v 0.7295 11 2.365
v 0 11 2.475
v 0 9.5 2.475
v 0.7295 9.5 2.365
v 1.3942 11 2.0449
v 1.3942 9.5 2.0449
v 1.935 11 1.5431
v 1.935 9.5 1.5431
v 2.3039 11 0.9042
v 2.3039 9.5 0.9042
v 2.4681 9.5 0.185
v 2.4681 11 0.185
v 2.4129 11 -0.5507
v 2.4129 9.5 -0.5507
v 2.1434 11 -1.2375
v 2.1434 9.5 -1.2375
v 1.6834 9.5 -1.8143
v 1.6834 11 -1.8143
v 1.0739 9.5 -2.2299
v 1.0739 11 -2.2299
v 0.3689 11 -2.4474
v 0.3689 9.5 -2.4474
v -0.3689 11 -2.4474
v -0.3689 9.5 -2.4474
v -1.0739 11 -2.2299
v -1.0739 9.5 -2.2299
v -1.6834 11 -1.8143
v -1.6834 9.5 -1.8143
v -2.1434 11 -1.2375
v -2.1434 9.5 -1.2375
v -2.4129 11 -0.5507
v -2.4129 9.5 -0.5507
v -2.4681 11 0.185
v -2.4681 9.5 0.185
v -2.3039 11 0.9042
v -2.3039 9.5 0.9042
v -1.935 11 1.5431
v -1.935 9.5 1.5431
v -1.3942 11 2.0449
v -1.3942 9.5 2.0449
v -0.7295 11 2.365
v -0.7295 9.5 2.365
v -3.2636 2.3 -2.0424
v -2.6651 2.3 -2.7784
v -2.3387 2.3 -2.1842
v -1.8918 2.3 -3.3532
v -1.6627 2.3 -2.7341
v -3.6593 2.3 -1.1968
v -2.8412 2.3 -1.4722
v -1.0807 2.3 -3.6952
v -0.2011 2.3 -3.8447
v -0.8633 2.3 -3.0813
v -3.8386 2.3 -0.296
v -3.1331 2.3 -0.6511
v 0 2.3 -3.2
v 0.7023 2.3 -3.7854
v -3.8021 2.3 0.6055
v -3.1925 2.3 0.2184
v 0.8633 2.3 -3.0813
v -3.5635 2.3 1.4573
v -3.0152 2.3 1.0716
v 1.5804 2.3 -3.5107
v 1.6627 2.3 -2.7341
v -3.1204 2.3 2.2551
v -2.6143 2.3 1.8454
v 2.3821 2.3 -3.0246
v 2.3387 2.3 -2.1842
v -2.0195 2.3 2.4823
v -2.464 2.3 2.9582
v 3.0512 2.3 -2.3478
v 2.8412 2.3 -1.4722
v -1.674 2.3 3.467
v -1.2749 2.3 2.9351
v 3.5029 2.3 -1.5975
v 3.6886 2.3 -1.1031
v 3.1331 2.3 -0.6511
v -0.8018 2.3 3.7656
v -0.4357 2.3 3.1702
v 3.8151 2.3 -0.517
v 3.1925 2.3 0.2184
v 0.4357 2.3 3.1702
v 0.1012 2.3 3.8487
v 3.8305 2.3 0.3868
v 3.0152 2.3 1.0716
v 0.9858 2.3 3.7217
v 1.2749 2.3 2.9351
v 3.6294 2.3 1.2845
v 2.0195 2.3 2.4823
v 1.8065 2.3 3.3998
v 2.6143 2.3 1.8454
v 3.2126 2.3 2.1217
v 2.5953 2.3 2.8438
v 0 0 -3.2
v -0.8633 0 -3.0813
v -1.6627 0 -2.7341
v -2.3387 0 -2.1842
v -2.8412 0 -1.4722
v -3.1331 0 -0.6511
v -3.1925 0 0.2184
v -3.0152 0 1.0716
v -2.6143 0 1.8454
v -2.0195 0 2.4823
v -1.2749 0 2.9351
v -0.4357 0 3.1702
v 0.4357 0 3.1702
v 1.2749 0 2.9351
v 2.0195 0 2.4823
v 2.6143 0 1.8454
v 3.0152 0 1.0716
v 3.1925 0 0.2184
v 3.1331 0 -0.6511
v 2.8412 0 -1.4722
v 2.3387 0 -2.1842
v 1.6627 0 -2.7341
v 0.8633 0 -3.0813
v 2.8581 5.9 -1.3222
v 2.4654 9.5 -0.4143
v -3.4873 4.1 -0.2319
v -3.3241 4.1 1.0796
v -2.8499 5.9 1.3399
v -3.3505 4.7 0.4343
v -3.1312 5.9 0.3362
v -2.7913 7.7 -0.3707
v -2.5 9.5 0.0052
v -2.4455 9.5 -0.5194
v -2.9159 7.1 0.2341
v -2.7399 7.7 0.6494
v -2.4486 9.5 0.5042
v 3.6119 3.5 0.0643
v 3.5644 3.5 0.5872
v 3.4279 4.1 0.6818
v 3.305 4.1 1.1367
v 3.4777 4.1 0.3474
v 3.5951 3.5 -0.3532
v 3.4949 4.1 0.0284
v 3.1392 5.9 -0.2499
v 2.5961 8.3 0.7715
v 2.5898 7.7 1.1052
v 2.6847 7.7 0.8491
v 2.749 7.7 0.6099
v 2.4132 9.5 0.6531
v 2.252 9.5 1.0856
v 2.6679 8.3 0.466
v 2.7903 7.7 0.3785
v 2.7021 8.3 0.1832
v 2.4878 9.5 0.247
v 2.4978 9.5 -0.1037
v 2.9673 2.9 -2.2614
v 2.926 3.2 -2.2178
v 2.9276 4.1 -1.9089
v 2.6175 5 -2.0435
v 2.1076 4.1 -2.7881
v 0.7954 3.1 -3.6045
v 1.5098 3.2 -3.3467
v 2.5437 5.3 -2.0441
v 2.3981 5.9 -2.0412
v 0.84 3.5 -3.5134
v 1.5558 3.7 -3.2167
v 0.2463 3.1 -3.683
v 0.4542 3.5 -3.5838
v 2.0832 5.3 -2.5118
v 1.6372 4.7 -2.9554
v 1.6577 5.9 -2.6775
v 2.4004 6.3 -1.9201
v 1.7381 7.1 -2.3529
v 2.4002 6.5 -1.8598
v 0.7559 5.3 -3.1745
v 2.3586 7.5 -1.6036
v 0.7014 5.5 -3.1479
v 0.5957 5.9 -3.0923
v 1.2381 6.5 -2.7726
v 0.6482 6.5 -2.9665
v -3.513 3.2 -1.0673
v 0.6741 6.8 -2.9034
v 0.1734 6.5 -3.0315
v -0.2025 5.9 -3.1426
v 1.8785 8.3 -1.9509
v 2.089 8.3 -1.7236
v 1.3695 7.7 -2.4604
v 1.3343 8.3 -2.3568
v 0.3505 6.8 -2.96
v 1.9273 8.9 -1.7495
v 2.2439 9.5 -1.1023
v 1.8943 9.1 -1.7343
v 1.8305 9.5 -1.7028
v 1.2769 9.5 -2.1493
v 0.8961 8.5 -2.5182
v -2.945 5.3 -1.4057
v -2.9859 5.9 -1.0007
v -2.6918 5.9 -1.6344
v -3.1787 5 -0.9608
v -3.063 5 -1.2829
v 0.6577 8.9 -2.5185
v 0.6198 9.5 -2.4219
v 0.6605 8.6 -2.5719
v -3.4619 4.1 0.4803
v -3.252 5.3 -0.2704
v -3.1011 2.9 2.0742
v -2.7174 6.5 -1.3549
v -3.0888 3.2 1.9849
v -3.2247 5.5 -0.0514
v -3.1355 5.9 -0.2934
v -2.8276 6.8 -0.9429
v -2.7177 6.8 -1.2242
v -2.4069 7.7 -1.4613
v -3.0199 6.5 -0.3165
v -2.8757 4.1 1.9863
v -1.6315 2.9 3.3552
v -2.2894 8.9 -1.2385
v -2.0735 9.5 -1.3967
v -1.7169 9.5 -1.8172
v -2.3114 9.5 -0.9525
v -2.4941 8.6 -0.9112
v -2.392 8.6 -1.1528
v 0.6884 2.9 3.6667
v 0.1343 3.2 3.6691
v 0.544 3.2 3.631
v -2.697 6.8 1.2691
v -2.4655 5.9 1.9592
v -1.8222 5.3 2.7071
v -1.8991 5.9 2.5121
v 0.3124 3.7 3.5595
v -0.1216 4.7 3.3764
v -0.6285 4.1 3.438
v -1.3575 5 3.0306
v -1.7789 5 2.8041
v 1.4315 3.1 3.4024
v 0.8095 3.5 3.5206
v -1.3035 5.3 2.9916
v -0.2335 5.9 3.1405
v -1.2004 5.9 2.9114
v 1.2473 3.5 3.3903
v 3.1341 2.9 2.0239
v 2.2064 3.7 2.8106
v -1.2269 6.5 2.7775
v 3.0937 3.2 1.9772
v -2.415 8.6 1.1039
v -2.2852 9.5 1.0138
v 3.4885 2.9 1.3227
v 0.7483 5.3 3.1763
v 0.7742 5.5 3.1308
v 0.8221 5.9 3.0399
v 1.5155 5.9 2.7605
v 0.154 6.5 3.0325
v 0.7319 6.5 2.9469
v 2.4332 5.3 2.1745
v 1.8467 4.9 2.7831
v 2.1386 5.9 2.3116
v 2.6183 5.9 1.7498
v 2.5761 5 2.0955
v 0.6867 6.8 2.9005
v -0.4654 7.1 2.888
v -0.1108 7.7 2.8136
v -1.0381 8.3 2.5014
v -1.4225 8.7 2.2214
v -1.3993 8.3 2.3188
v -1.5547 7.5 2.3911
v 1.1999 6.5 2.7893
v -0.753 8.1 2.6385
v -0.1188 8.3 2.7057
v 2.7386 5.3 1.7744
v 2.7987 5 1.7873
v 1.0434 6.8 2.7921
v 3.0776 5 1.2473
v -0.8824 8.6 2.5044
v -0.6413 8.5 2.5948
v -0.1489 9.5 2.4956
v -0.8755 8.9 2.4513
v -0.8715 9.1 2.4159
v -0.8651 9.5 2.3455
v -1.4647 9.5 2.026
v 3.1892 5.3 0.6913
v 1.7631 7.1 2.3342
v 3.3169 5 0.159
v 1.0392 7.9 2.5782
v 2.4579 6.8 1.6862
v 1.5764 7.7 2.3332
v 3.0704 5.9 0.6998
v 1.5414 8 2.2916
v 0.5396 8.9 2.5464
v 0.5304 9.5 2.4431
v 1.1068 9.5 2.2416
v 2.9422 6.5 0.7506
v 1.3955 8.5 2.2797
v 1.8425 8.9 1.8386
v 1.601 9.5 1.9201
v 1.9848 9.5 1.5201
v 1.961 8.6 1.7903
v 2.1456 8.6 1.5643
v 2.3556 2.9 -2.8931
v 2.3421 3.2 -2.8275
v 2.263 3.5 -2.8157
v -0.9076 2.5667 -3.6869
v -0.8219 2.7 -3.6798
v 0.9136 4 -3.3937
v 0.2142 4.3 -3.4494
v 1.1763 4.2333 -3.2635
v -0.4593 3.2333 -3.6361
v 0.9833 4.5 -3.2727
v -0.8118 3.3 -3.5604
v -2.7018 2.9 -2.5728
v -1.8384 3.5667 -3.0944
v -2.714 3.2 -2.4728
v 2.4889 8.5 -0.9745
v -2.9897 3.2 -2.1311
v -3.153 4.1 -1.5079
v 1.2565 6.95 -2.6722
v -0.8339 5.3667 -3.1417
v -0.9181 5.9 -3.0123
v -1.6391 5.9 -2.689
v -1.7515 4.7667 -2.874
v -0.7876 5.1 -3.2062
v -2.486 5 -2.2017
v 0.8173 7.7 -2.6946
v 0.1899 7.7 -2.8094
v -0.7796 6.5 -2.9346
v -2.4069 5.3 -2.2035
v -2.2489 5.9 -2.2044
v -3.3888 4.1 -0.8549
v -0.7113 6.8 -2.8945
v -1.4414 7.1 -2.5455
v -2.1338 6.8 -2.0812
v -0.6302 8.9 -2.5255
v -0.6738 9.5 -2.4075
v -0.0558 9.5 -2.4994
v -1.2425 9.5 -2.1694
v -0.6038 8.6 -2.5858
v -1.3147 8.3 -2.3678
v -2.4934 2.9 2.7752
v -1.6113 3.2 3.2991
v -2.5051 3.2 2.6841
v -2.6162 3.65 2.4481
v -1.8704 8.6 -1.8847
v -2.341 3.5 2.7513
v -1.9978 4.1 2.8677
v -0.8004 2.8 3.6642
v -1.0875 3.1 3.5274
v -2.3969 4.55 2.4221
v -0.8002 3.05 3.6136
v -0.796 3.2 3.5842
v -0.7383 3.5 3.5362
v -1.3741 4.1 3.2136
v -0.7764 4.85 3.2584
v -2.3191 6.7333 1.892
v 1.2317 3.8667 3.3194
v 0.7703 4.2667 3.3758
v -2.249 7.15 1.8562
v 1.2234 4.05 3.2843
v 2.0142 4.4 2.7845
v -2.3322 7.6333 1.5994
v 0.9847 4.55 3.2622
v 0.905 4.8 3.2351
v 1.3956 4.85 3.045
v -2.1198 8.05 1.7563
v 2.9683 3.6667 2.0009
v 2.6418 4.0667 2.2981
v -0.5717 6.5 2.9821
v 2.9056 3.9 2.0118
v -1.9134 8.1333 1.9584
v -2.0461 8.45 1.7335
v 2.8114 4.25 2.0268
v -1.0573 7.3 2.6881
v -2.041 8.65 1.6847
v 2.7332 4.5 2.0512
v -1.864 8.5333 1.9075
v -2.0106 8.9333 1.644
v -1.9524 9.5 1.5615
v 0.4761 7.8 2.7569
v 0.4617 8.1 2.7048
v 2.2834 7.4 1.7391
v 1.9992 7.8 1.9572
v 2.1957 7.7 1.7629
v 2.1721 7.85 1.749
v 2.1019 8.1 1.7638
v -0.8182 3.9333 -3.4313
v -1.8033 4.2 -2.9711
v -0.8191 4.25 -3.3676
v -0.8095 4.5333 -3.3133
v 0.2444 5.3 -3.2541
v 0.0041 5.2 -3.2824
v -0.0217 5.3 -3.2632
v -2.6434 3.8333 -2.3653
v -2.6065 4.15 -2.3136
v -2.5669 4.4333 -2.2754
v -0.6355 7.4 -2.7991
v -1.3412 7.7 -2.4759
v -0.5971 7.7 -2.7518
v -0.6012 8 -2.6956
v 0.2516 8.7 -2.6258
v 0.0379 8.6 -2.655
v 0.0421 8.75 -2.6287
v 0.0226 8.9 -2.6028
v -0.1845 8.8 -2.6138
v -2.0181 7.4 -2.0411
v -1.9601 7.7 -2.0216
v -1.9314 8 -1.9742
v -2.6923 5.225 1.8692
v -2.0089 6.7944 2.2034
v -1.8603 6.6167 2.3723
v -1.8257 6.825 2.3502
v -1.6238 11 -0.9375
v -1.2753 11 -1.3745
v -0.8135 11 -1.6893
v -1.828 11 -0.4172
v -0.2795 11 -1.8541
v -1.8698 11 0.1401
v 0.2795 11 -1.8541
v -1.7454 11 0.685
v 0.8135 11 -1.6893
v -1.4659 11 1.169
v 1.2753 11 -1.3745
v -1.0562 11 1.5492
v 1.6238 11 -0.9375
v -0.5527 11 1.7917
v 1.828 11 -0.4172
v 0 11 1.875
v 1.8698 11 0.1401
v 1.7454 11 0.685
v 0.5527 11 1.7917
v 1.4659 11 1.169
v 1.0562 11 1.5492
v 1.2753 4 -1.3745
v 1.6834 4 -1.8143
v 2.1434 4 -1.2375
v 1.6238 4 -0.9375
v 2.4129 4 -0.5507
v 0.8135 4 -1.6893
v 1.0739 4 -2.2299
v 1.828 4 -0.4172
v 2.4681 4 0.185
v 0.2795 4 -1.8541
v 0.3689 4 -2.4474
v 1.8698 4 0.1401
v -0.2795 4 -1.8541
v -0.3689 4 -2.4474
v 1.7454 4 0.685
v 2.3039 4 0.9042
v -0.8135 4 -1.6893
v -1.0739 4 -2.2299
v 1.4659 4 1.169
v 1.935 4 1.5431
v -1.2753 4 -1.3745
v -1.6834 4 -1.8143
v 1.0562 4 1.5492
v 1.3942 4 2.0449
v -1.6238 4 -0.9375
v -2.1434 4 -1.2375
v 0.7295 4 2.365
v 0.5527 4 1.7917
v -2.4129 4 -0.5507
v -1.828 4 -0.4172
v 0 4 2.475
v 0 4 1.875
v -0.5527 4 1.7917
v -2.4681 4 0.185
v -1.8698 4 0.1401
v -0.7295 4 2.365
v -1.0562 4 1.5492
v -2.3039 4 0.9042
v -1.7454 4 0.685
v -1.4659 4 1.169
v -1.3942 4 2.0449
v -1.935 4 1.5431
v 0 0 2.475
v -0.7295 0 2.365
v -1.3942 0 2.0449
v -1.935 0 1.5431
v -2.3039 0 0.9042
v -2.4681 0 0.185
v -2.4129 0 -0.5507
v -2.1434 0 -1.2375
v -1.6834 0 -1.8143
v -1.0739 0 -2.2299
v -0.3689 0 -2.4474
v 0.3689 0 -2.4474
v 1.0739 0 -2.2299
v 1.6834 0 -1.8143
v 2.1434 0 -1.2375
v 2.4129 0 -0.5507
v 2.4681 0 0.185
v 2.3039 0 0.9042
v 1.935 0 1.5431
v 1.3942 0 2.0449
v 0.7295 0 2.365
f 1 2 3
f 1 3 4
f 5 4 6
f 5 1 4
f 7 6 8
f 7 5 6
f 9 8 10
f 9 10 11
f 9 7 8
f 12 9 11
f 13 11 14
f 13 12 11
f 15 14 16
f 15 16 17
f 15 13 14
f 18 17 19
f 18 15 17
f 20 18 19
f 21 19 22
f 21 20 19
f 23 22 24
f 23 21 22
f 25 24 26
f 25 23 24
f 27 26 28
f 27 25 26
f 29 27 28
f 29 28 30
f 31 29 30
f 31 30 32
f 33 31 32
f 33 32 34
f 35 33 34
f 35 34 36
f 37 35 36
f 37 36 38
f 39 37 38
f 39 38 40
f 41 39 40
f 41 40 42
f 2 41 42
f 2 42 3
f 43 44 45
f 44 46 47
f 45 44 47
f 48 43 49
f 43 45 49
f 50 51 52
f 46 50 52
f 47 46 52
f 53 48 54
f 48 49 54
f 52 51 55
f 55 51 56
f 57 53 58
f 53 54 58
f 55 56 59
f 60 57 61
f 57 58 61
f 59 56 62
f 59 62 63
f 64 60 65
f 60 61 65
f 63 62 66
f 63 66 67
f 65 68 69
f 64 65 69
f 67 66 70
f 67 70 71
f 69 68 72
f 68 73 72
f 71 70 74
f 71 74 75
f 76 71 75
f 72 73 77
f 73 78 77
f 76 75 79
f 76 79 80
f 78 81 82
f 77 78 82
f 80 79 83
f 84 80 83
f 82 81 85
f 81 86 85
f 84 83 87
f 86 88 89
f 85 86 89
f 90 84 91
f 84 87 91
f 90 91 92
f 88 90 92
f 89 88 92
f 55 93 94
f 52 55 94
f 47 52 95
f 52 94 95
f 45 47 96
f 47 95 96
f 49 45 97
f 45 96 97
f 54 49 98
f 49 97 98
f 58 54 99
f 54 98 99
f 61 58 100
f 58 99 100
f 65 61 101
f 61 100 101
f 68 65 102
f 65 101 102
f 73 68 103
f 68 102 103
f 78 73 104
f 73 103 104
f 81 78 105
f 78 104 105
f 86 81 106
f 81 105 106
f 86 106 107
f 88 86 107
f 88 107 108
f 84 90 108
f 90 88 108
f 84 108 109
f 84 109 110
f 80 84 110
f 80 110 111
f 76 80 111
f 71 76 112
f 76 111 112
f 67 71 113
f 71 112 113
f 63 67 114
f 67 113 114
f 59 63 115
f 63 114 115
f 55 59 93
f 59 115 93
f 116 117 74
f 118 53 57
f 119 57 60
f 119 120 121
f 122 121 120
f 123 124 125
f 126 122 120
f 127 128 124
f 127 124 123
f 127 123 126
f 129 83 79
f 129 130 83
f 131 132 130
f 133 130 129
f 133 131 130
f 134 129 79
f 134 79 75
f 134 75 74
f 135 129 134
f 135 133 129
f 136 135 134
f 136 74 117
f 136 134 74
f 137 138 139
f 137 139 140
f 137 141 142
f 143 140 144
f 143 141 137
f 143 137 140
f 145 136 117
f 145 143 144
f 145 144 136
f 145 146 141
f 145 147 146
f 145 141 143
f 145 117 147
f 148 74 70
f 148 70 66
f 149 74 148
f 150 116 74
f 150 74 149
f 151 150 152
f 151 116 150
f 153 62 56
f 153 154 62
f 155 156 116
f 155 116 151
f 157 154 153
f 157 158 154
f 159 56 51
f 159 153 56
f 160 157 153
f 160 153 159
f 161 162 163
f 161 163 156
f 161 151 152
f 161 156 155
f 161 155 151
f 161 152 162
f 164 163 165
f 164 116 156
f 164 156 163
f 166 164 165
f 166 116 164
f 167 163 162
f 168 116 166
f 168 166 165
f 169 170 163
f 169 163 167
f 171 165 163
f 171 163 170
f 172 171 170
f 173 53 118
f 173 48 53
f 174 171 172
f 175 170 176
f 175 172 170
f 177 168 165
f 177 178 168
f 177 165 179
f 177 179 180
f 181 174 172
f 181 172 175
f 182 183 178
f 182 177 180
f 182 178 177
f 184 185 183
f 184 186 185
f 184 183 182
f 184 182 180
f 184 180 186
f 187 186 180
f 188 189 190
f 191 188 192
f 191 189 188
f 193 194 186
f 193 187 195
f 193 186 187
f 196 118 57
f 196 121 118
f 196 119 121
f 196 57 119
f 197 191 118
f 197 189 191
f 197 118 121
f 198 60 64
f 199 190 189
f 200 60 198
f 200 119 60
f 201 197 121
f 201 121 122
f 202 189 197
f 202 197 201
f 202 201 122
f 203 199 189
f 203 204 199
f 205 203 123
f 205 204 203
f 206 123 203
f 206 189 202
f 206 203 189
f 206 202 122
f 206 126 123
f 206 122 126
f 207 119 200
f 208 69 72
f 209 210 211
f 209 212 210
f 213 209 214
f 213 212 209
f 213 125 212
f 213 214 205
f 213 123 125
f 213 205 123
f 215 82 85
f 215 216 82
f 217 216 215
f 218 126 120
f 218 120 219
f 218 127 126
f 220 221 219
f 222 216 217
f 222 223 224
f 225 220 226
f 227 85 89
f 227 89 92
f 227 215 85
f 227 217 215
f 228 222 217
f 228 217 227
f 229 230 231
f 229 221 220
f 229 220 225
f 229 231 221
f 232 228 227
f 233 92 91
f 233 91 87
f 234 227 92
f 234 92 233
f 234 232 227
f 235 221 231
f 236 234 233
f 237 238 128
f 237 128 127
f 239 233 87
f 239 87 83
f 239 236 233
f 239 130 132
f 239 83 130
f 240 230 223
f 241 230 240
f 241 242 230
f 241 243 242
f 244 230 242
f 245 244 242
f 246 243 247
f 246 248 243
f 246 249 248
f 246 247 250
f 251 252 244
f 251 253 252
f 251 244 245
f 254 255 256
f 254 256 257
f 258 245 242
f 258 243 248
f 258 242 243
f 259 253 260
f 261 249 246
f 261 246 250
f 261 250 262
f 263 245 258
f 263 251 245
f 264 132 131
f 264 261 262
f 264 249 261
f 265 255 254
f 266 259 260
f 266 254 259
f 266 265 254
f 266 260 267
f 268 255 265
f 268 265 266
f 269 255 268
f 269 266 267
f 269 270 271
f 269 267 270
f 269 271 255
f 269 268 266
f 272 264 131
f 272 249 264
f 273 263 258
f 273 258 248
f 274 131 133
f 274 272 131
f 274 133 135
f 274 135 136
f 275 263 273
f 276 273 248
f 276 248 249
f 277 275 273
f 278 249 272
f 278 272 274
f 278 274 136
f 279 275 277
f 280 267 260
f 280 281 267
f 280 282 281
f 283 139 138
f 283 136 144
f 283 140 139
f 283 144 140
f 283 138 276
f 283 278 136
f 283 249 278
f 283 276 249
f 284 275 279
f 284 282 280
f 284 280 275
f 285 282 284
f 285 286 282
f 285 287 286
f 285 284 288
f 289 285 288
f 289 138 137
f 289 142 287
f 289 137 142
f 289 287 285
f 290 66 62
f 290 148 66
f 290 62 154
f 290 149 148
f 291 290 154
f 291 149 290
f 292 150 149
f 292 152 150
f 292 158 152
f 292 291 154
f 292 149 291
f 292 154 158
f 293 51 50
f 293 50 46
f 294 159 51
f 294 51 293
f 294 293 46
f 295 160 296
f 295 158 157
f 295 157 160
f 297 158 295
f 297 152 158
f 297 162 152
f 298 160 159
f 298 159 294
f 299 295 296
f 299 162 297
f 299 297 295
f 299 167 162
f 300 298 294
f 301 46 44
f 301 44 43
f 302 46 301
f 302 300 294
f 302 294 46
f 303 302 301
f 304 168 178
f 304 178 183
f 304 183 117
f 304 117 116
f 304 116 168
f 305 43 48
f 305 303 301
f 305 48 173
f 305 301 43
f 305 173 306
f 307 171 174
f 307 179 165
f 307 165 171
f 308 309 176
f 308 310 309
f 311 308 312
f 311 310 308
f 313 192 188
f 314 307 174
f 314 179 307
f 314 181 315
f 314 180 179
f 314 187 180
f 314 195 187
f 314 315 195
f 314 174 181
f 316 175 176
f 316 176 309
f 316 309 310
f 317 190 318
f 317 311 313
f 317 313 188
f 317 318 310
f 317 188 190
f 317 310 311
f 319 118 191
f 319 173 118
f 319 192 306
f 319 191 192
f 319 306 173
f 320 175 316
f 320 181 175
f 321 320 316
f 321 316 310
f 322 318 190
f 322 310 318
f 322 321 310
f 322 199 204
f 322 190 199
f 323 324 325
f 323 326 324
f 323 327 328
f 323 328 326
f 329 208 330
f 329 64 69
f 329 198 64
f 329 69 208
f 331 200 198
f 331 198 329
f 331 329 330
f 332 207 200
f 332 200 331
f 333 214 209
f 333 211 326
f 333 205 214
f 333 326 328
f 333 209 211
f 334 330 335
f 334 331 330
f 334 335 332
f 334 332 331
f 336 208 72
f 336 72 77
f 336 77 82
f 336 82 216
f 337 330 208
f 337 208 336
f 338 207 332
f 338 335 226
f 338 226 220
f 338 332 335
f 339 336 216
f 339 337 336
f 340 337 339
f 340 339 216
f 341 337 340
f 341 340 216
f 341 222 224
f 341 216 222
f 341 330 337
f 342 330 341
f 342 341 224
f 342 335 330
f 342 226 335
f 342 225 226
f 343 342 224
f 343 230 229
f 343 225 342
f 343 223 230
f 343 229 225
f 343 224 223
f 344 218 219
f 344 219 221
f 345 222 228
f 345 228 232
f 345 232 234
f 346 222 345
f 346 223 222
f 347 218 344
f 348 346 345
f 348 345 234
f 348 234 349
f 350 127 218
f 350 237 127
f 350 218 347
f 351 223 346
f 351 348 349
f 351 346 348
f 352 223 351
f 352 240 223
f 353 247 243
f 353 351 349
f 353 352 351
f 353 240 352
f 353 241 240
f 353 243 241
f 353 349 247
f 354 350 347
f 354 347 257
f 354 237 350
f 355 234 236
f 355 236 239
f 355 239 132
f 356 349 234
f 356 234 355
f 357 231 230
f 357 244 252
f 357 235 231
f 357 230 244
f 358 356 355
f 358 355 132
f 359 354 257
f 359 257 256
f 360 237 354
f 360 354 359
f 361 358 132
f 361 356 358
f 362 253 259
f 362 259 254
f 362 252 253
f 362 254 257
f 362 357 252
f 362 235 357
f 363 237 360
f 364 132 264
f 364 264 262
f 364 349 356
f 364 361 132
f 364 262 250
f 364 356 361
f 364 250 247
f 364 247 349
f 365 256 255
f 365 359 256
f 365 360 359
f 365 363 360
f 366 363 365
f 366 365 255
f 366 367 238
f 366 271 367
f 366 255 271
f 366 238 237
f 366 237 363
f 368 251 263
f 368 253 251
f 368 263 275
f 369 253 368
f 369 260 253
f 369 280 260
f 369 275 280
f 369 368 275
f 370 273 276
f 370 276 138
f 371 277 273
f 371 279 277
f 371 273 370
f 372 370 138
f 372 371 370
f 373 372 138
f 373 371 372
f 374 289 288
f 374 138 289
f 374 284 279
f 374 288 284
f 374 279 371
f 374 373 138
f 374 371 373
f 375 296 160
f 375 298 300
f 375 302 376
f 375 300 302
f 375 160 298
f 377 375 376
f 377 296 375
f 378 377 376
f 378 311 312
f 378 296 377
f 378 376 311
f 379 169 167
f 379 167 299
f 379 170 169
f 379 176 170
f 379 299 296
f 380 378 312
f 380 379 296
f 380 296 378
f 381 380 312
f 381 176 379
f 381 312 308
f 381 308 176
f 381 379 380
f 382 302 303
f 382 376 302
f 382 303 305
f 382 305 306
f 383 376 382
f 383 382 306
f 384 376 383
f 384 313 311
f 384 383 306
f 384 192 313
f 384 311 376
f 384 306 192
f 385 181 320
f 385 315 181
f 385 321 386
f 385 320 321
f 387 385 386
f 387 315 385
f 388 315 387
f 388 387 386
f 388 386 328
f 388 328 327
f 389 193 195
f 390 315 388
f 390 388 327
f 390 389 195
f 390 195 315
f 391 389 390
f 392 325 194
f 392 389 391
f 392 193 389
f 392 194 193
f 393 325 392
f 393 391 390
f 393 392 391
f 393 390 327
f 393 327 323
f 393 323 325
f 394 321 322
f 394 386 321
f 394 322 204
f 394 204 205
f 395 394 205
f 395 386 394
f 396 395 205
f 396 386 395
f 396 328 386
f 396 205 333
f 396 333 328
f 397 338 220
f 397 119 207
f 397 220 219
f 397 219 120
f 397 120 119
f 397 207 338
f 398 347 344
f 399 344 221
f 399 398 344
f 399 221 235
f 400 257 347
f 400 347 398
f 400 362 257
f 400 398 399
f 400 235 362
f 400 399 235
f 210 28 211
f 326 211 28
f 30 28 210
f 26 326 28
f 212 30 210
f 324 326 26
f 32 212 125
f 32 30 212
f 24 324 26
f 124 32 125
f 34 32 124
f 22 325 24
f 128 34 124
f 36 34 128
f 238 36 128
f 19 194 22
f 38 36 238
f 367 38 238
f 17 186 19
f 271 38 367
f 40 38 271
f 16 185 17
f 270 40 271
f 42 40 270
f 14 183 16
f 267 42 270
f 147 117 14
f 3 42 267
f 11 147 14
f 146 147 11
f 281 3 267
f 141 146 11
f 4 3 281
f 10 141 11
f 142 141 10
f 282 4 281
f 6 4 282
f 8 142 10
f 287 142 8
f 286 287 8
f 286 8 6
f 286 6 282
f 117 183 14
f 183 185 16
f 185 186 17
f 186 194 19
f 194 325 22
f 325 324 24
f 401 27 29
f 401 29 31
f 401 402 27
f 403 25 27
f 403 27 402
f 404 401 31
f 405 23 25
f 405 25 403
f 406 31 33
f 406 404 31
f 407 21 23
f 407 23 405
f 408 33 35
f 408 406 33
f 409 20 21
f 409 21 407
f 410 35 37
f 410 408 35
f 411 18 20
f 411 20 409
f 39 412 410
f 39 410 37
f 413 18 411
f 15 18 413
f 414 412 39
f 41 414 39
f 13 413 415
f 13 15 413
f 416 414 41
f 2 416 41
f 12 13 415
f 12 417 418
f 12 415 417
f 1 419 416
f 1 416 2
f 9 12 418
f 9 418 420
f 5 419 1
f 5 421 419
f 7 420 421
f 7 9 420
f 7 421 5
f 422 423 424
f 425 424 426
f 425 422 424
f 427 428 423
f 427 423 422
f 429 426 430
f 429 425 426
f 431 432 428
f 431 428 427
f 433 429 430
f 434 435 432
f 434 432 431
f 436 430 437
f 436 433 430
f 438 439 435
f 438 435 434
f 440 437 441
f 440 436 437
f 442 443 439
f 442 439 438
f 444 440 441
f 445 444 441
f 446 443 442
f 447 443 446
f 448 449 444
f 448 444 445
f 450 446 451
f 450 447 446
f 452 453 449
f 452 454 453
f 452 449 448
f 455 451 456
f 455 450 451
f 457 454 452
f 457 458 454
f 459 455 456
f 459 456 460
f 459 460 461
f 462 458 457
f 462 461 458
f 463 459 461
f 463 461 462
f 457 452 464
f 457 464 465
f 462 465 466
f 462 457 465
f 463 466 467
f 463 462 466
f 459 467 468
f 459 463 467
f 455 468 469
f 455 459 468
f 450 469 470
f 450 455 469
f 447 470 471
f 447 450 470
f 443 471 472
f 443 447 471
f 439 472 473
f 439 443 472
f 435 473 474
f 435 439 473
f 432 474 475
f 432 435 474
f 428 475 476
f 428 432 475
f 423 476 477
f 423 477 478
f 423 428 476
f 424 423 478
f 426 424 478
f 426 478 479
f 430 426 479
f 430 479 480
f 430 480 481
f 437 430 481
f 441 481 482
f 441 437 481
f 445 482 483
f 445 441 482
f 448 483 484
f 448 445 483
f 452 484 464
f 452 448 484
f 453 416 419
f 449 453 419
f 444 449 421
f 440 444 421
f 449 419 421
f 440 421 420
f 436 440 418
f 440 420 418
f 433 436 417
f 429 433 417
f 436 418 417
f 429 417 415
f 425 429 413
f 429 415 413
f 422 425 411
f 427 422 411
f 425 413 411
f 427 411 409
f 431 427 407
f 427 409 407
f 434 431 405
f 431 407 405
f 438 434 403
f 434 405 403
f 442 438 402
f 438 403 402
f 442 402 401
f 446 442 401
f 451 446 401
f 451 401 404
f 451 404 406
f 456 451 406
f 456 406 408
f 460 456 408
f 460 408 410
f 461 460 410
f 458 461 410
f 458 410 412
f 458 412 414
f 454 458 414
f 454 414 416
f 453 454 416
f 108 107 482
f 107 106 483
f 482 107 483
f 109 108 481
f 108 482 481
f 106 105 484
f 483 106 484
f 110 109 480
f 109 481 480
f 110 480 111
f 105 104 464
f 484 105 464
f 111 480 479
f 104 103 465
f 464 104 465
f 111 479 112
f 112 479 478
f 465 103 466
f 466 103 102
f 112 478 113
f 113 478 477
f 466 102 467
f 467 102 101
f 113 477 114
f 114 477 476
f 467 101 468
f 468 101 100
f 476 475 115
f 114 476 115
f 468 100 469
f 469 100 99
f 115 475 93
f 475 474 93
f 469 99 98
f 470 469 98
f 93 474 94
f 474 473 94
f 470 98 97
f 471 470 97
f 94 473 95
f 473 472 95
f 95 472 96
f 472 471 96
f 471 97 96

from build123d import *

# Parameters (mm, degrees)
BOSS_EXTRUDE1_REACH = 12.263
SKETCH4_R           = 2.475
BOSS_EXTRUDE2_REACH = 14.274
SKETCH1_R           = 3.2
CUT_EXTRUDE1_START  = -4
SKETCH5_R           = 2.475
CUT_EXTRUDE1_DEPTH  = 4
CUT_EXTRUDE2_REACH  = 14.274
SKETCH6_R           = 1.875


with BuildPart() as part:
    # Loft4: read off the stored shape, not the designer's step
    # Loft4: loft between two sections, ruled curve by curve
    loft4_from = [
        Edge.make_bspline([(3.50290491, 2.3, -1.597547242), (0.307810426, 2.3, -8.603357062), (-6.697999394, 2.3, -5.408262578), (-3.50290491, 2.3, 1.597547242), (-0.307810426, 2.3, 8.603357062), (6.697999394, 2.3, 5.408262578), (3.50290491, 2.3, -1.597547242)], [0, 0, 0, 0, 0.5, 0.5, 0.5, 1, 1, 1, 1], 3, [1, 0.333333333, 0.333333333, 1, 0.333333333, 0.333333333, 1]),
    ]
    loft4_to = [
        Edge.make_bspline([(2.465425341, 9.5, -0.414340307), (1.636744726, 9.5, -5.345190988), (-3.294105955, 9.5, -4.516510374), (-2.465425341, 9.5, 0.414340307), (-1.636744726, 9.5, 5.345190988), (3.294105955, 9.5, 4.516510374), (2.465425341, 9.5, -0.414340307)], [0, 0, 0, 0, 0.5, 0.5, 0.5, 1, 1, 1, 1], 3, [1, 0.333333333, 0.333333333, 1, 0.333333333, 0.333333333, 1]),
    ]
    loft4 = Solid(Shell([*[Face.make_surface_from_curves(loft4_from[k], loft4_to[k]) for k in range(1)], Face(Wire(loft4_from)), Face(Wire(loft4_to))]))
    add(loft4)

    # Sketch4 → Boss-Extrude1 (add, up to next)
    with BuildSketch(Plane(origin=(0, 11, 0), x_dir=(-1, 0, 0), z_dir=(0, 1, 0)), mode=Mode.PRIVATE) as boss_extrude1_sk1:
        with Locations(Location((0, 0, 0), (0, 0, 90))):
            Circle(SKETCH4_R)
    boss_extrude1_tool1 = extrude(boss_extrude1_sk1.sketch, amount=-BOSS_EXTRUDE1_REACH, mode=Mode.PRIVATE) - part.part
    add(boss_extrude1_tool1.solids().sort_by_distance((0, 11, 0))[0])

    # Sketch1 → Boss-Extrude2 (add, up to next)
    with BuildSketch(Plane(origin=(0, 0, 0), x_dir=(1, 0, 0), z_dir=(0, 1, 0)), mode=Mode.PRIVATE) as boss_extrude2_sk1:
        with Locations(Location((0, 0, 0), (0, 0, 90))):
            Circle(SKETCH1_R)
    boss_extrude2_tool1 = extrude(boss_extrude2_sk1.sketch, amount=BOSS_EXTRUDE2_REACH, mode=Mode.PRIVATE) - part.part
    add(boss_extrude2_tool1.solids().sort_by_distance((0, 0, 0))[0])

    # Sketch5 → Cut-Extrude1 (cut)
    with BuildSketch(Plane.XZ.offset(CUT_EXTRUDE1_START)):
        with Locations(Location((0, 0, 0), (0, 0, 90))):
            Circle(SKETCH5_R)
    extrude(amount=CUT_EXTRUDE1_DEPTH, mode=Mode.SUBTRACT)

    # Sketch6 → Cut-Extrude2 (cut, up to next)
    with BuildSketch(Plane(origin=(0, 11, 0), x_dir=(1, 0, 0), z_dir=(0, 1, 0)), mode=Mode.PRIVATE) as cut_extrude2_sk1:
        with Locations(Location((0, 0, 0), (0, 0, 270))):
            Circle(SKETCH6_R)
    cut_extrude2_tool1 = extrude(cut_extrude2_sk1.sketch, amount=-CUT_EXTRUDE2_REACH, mode=Mode.PRIVATE) & part.part
    add(cut_extrude2_tool1.solids().sort_by_distance((0, 11, 0))[0], mode=Mode.SUBTRACT)


solid = part.part
